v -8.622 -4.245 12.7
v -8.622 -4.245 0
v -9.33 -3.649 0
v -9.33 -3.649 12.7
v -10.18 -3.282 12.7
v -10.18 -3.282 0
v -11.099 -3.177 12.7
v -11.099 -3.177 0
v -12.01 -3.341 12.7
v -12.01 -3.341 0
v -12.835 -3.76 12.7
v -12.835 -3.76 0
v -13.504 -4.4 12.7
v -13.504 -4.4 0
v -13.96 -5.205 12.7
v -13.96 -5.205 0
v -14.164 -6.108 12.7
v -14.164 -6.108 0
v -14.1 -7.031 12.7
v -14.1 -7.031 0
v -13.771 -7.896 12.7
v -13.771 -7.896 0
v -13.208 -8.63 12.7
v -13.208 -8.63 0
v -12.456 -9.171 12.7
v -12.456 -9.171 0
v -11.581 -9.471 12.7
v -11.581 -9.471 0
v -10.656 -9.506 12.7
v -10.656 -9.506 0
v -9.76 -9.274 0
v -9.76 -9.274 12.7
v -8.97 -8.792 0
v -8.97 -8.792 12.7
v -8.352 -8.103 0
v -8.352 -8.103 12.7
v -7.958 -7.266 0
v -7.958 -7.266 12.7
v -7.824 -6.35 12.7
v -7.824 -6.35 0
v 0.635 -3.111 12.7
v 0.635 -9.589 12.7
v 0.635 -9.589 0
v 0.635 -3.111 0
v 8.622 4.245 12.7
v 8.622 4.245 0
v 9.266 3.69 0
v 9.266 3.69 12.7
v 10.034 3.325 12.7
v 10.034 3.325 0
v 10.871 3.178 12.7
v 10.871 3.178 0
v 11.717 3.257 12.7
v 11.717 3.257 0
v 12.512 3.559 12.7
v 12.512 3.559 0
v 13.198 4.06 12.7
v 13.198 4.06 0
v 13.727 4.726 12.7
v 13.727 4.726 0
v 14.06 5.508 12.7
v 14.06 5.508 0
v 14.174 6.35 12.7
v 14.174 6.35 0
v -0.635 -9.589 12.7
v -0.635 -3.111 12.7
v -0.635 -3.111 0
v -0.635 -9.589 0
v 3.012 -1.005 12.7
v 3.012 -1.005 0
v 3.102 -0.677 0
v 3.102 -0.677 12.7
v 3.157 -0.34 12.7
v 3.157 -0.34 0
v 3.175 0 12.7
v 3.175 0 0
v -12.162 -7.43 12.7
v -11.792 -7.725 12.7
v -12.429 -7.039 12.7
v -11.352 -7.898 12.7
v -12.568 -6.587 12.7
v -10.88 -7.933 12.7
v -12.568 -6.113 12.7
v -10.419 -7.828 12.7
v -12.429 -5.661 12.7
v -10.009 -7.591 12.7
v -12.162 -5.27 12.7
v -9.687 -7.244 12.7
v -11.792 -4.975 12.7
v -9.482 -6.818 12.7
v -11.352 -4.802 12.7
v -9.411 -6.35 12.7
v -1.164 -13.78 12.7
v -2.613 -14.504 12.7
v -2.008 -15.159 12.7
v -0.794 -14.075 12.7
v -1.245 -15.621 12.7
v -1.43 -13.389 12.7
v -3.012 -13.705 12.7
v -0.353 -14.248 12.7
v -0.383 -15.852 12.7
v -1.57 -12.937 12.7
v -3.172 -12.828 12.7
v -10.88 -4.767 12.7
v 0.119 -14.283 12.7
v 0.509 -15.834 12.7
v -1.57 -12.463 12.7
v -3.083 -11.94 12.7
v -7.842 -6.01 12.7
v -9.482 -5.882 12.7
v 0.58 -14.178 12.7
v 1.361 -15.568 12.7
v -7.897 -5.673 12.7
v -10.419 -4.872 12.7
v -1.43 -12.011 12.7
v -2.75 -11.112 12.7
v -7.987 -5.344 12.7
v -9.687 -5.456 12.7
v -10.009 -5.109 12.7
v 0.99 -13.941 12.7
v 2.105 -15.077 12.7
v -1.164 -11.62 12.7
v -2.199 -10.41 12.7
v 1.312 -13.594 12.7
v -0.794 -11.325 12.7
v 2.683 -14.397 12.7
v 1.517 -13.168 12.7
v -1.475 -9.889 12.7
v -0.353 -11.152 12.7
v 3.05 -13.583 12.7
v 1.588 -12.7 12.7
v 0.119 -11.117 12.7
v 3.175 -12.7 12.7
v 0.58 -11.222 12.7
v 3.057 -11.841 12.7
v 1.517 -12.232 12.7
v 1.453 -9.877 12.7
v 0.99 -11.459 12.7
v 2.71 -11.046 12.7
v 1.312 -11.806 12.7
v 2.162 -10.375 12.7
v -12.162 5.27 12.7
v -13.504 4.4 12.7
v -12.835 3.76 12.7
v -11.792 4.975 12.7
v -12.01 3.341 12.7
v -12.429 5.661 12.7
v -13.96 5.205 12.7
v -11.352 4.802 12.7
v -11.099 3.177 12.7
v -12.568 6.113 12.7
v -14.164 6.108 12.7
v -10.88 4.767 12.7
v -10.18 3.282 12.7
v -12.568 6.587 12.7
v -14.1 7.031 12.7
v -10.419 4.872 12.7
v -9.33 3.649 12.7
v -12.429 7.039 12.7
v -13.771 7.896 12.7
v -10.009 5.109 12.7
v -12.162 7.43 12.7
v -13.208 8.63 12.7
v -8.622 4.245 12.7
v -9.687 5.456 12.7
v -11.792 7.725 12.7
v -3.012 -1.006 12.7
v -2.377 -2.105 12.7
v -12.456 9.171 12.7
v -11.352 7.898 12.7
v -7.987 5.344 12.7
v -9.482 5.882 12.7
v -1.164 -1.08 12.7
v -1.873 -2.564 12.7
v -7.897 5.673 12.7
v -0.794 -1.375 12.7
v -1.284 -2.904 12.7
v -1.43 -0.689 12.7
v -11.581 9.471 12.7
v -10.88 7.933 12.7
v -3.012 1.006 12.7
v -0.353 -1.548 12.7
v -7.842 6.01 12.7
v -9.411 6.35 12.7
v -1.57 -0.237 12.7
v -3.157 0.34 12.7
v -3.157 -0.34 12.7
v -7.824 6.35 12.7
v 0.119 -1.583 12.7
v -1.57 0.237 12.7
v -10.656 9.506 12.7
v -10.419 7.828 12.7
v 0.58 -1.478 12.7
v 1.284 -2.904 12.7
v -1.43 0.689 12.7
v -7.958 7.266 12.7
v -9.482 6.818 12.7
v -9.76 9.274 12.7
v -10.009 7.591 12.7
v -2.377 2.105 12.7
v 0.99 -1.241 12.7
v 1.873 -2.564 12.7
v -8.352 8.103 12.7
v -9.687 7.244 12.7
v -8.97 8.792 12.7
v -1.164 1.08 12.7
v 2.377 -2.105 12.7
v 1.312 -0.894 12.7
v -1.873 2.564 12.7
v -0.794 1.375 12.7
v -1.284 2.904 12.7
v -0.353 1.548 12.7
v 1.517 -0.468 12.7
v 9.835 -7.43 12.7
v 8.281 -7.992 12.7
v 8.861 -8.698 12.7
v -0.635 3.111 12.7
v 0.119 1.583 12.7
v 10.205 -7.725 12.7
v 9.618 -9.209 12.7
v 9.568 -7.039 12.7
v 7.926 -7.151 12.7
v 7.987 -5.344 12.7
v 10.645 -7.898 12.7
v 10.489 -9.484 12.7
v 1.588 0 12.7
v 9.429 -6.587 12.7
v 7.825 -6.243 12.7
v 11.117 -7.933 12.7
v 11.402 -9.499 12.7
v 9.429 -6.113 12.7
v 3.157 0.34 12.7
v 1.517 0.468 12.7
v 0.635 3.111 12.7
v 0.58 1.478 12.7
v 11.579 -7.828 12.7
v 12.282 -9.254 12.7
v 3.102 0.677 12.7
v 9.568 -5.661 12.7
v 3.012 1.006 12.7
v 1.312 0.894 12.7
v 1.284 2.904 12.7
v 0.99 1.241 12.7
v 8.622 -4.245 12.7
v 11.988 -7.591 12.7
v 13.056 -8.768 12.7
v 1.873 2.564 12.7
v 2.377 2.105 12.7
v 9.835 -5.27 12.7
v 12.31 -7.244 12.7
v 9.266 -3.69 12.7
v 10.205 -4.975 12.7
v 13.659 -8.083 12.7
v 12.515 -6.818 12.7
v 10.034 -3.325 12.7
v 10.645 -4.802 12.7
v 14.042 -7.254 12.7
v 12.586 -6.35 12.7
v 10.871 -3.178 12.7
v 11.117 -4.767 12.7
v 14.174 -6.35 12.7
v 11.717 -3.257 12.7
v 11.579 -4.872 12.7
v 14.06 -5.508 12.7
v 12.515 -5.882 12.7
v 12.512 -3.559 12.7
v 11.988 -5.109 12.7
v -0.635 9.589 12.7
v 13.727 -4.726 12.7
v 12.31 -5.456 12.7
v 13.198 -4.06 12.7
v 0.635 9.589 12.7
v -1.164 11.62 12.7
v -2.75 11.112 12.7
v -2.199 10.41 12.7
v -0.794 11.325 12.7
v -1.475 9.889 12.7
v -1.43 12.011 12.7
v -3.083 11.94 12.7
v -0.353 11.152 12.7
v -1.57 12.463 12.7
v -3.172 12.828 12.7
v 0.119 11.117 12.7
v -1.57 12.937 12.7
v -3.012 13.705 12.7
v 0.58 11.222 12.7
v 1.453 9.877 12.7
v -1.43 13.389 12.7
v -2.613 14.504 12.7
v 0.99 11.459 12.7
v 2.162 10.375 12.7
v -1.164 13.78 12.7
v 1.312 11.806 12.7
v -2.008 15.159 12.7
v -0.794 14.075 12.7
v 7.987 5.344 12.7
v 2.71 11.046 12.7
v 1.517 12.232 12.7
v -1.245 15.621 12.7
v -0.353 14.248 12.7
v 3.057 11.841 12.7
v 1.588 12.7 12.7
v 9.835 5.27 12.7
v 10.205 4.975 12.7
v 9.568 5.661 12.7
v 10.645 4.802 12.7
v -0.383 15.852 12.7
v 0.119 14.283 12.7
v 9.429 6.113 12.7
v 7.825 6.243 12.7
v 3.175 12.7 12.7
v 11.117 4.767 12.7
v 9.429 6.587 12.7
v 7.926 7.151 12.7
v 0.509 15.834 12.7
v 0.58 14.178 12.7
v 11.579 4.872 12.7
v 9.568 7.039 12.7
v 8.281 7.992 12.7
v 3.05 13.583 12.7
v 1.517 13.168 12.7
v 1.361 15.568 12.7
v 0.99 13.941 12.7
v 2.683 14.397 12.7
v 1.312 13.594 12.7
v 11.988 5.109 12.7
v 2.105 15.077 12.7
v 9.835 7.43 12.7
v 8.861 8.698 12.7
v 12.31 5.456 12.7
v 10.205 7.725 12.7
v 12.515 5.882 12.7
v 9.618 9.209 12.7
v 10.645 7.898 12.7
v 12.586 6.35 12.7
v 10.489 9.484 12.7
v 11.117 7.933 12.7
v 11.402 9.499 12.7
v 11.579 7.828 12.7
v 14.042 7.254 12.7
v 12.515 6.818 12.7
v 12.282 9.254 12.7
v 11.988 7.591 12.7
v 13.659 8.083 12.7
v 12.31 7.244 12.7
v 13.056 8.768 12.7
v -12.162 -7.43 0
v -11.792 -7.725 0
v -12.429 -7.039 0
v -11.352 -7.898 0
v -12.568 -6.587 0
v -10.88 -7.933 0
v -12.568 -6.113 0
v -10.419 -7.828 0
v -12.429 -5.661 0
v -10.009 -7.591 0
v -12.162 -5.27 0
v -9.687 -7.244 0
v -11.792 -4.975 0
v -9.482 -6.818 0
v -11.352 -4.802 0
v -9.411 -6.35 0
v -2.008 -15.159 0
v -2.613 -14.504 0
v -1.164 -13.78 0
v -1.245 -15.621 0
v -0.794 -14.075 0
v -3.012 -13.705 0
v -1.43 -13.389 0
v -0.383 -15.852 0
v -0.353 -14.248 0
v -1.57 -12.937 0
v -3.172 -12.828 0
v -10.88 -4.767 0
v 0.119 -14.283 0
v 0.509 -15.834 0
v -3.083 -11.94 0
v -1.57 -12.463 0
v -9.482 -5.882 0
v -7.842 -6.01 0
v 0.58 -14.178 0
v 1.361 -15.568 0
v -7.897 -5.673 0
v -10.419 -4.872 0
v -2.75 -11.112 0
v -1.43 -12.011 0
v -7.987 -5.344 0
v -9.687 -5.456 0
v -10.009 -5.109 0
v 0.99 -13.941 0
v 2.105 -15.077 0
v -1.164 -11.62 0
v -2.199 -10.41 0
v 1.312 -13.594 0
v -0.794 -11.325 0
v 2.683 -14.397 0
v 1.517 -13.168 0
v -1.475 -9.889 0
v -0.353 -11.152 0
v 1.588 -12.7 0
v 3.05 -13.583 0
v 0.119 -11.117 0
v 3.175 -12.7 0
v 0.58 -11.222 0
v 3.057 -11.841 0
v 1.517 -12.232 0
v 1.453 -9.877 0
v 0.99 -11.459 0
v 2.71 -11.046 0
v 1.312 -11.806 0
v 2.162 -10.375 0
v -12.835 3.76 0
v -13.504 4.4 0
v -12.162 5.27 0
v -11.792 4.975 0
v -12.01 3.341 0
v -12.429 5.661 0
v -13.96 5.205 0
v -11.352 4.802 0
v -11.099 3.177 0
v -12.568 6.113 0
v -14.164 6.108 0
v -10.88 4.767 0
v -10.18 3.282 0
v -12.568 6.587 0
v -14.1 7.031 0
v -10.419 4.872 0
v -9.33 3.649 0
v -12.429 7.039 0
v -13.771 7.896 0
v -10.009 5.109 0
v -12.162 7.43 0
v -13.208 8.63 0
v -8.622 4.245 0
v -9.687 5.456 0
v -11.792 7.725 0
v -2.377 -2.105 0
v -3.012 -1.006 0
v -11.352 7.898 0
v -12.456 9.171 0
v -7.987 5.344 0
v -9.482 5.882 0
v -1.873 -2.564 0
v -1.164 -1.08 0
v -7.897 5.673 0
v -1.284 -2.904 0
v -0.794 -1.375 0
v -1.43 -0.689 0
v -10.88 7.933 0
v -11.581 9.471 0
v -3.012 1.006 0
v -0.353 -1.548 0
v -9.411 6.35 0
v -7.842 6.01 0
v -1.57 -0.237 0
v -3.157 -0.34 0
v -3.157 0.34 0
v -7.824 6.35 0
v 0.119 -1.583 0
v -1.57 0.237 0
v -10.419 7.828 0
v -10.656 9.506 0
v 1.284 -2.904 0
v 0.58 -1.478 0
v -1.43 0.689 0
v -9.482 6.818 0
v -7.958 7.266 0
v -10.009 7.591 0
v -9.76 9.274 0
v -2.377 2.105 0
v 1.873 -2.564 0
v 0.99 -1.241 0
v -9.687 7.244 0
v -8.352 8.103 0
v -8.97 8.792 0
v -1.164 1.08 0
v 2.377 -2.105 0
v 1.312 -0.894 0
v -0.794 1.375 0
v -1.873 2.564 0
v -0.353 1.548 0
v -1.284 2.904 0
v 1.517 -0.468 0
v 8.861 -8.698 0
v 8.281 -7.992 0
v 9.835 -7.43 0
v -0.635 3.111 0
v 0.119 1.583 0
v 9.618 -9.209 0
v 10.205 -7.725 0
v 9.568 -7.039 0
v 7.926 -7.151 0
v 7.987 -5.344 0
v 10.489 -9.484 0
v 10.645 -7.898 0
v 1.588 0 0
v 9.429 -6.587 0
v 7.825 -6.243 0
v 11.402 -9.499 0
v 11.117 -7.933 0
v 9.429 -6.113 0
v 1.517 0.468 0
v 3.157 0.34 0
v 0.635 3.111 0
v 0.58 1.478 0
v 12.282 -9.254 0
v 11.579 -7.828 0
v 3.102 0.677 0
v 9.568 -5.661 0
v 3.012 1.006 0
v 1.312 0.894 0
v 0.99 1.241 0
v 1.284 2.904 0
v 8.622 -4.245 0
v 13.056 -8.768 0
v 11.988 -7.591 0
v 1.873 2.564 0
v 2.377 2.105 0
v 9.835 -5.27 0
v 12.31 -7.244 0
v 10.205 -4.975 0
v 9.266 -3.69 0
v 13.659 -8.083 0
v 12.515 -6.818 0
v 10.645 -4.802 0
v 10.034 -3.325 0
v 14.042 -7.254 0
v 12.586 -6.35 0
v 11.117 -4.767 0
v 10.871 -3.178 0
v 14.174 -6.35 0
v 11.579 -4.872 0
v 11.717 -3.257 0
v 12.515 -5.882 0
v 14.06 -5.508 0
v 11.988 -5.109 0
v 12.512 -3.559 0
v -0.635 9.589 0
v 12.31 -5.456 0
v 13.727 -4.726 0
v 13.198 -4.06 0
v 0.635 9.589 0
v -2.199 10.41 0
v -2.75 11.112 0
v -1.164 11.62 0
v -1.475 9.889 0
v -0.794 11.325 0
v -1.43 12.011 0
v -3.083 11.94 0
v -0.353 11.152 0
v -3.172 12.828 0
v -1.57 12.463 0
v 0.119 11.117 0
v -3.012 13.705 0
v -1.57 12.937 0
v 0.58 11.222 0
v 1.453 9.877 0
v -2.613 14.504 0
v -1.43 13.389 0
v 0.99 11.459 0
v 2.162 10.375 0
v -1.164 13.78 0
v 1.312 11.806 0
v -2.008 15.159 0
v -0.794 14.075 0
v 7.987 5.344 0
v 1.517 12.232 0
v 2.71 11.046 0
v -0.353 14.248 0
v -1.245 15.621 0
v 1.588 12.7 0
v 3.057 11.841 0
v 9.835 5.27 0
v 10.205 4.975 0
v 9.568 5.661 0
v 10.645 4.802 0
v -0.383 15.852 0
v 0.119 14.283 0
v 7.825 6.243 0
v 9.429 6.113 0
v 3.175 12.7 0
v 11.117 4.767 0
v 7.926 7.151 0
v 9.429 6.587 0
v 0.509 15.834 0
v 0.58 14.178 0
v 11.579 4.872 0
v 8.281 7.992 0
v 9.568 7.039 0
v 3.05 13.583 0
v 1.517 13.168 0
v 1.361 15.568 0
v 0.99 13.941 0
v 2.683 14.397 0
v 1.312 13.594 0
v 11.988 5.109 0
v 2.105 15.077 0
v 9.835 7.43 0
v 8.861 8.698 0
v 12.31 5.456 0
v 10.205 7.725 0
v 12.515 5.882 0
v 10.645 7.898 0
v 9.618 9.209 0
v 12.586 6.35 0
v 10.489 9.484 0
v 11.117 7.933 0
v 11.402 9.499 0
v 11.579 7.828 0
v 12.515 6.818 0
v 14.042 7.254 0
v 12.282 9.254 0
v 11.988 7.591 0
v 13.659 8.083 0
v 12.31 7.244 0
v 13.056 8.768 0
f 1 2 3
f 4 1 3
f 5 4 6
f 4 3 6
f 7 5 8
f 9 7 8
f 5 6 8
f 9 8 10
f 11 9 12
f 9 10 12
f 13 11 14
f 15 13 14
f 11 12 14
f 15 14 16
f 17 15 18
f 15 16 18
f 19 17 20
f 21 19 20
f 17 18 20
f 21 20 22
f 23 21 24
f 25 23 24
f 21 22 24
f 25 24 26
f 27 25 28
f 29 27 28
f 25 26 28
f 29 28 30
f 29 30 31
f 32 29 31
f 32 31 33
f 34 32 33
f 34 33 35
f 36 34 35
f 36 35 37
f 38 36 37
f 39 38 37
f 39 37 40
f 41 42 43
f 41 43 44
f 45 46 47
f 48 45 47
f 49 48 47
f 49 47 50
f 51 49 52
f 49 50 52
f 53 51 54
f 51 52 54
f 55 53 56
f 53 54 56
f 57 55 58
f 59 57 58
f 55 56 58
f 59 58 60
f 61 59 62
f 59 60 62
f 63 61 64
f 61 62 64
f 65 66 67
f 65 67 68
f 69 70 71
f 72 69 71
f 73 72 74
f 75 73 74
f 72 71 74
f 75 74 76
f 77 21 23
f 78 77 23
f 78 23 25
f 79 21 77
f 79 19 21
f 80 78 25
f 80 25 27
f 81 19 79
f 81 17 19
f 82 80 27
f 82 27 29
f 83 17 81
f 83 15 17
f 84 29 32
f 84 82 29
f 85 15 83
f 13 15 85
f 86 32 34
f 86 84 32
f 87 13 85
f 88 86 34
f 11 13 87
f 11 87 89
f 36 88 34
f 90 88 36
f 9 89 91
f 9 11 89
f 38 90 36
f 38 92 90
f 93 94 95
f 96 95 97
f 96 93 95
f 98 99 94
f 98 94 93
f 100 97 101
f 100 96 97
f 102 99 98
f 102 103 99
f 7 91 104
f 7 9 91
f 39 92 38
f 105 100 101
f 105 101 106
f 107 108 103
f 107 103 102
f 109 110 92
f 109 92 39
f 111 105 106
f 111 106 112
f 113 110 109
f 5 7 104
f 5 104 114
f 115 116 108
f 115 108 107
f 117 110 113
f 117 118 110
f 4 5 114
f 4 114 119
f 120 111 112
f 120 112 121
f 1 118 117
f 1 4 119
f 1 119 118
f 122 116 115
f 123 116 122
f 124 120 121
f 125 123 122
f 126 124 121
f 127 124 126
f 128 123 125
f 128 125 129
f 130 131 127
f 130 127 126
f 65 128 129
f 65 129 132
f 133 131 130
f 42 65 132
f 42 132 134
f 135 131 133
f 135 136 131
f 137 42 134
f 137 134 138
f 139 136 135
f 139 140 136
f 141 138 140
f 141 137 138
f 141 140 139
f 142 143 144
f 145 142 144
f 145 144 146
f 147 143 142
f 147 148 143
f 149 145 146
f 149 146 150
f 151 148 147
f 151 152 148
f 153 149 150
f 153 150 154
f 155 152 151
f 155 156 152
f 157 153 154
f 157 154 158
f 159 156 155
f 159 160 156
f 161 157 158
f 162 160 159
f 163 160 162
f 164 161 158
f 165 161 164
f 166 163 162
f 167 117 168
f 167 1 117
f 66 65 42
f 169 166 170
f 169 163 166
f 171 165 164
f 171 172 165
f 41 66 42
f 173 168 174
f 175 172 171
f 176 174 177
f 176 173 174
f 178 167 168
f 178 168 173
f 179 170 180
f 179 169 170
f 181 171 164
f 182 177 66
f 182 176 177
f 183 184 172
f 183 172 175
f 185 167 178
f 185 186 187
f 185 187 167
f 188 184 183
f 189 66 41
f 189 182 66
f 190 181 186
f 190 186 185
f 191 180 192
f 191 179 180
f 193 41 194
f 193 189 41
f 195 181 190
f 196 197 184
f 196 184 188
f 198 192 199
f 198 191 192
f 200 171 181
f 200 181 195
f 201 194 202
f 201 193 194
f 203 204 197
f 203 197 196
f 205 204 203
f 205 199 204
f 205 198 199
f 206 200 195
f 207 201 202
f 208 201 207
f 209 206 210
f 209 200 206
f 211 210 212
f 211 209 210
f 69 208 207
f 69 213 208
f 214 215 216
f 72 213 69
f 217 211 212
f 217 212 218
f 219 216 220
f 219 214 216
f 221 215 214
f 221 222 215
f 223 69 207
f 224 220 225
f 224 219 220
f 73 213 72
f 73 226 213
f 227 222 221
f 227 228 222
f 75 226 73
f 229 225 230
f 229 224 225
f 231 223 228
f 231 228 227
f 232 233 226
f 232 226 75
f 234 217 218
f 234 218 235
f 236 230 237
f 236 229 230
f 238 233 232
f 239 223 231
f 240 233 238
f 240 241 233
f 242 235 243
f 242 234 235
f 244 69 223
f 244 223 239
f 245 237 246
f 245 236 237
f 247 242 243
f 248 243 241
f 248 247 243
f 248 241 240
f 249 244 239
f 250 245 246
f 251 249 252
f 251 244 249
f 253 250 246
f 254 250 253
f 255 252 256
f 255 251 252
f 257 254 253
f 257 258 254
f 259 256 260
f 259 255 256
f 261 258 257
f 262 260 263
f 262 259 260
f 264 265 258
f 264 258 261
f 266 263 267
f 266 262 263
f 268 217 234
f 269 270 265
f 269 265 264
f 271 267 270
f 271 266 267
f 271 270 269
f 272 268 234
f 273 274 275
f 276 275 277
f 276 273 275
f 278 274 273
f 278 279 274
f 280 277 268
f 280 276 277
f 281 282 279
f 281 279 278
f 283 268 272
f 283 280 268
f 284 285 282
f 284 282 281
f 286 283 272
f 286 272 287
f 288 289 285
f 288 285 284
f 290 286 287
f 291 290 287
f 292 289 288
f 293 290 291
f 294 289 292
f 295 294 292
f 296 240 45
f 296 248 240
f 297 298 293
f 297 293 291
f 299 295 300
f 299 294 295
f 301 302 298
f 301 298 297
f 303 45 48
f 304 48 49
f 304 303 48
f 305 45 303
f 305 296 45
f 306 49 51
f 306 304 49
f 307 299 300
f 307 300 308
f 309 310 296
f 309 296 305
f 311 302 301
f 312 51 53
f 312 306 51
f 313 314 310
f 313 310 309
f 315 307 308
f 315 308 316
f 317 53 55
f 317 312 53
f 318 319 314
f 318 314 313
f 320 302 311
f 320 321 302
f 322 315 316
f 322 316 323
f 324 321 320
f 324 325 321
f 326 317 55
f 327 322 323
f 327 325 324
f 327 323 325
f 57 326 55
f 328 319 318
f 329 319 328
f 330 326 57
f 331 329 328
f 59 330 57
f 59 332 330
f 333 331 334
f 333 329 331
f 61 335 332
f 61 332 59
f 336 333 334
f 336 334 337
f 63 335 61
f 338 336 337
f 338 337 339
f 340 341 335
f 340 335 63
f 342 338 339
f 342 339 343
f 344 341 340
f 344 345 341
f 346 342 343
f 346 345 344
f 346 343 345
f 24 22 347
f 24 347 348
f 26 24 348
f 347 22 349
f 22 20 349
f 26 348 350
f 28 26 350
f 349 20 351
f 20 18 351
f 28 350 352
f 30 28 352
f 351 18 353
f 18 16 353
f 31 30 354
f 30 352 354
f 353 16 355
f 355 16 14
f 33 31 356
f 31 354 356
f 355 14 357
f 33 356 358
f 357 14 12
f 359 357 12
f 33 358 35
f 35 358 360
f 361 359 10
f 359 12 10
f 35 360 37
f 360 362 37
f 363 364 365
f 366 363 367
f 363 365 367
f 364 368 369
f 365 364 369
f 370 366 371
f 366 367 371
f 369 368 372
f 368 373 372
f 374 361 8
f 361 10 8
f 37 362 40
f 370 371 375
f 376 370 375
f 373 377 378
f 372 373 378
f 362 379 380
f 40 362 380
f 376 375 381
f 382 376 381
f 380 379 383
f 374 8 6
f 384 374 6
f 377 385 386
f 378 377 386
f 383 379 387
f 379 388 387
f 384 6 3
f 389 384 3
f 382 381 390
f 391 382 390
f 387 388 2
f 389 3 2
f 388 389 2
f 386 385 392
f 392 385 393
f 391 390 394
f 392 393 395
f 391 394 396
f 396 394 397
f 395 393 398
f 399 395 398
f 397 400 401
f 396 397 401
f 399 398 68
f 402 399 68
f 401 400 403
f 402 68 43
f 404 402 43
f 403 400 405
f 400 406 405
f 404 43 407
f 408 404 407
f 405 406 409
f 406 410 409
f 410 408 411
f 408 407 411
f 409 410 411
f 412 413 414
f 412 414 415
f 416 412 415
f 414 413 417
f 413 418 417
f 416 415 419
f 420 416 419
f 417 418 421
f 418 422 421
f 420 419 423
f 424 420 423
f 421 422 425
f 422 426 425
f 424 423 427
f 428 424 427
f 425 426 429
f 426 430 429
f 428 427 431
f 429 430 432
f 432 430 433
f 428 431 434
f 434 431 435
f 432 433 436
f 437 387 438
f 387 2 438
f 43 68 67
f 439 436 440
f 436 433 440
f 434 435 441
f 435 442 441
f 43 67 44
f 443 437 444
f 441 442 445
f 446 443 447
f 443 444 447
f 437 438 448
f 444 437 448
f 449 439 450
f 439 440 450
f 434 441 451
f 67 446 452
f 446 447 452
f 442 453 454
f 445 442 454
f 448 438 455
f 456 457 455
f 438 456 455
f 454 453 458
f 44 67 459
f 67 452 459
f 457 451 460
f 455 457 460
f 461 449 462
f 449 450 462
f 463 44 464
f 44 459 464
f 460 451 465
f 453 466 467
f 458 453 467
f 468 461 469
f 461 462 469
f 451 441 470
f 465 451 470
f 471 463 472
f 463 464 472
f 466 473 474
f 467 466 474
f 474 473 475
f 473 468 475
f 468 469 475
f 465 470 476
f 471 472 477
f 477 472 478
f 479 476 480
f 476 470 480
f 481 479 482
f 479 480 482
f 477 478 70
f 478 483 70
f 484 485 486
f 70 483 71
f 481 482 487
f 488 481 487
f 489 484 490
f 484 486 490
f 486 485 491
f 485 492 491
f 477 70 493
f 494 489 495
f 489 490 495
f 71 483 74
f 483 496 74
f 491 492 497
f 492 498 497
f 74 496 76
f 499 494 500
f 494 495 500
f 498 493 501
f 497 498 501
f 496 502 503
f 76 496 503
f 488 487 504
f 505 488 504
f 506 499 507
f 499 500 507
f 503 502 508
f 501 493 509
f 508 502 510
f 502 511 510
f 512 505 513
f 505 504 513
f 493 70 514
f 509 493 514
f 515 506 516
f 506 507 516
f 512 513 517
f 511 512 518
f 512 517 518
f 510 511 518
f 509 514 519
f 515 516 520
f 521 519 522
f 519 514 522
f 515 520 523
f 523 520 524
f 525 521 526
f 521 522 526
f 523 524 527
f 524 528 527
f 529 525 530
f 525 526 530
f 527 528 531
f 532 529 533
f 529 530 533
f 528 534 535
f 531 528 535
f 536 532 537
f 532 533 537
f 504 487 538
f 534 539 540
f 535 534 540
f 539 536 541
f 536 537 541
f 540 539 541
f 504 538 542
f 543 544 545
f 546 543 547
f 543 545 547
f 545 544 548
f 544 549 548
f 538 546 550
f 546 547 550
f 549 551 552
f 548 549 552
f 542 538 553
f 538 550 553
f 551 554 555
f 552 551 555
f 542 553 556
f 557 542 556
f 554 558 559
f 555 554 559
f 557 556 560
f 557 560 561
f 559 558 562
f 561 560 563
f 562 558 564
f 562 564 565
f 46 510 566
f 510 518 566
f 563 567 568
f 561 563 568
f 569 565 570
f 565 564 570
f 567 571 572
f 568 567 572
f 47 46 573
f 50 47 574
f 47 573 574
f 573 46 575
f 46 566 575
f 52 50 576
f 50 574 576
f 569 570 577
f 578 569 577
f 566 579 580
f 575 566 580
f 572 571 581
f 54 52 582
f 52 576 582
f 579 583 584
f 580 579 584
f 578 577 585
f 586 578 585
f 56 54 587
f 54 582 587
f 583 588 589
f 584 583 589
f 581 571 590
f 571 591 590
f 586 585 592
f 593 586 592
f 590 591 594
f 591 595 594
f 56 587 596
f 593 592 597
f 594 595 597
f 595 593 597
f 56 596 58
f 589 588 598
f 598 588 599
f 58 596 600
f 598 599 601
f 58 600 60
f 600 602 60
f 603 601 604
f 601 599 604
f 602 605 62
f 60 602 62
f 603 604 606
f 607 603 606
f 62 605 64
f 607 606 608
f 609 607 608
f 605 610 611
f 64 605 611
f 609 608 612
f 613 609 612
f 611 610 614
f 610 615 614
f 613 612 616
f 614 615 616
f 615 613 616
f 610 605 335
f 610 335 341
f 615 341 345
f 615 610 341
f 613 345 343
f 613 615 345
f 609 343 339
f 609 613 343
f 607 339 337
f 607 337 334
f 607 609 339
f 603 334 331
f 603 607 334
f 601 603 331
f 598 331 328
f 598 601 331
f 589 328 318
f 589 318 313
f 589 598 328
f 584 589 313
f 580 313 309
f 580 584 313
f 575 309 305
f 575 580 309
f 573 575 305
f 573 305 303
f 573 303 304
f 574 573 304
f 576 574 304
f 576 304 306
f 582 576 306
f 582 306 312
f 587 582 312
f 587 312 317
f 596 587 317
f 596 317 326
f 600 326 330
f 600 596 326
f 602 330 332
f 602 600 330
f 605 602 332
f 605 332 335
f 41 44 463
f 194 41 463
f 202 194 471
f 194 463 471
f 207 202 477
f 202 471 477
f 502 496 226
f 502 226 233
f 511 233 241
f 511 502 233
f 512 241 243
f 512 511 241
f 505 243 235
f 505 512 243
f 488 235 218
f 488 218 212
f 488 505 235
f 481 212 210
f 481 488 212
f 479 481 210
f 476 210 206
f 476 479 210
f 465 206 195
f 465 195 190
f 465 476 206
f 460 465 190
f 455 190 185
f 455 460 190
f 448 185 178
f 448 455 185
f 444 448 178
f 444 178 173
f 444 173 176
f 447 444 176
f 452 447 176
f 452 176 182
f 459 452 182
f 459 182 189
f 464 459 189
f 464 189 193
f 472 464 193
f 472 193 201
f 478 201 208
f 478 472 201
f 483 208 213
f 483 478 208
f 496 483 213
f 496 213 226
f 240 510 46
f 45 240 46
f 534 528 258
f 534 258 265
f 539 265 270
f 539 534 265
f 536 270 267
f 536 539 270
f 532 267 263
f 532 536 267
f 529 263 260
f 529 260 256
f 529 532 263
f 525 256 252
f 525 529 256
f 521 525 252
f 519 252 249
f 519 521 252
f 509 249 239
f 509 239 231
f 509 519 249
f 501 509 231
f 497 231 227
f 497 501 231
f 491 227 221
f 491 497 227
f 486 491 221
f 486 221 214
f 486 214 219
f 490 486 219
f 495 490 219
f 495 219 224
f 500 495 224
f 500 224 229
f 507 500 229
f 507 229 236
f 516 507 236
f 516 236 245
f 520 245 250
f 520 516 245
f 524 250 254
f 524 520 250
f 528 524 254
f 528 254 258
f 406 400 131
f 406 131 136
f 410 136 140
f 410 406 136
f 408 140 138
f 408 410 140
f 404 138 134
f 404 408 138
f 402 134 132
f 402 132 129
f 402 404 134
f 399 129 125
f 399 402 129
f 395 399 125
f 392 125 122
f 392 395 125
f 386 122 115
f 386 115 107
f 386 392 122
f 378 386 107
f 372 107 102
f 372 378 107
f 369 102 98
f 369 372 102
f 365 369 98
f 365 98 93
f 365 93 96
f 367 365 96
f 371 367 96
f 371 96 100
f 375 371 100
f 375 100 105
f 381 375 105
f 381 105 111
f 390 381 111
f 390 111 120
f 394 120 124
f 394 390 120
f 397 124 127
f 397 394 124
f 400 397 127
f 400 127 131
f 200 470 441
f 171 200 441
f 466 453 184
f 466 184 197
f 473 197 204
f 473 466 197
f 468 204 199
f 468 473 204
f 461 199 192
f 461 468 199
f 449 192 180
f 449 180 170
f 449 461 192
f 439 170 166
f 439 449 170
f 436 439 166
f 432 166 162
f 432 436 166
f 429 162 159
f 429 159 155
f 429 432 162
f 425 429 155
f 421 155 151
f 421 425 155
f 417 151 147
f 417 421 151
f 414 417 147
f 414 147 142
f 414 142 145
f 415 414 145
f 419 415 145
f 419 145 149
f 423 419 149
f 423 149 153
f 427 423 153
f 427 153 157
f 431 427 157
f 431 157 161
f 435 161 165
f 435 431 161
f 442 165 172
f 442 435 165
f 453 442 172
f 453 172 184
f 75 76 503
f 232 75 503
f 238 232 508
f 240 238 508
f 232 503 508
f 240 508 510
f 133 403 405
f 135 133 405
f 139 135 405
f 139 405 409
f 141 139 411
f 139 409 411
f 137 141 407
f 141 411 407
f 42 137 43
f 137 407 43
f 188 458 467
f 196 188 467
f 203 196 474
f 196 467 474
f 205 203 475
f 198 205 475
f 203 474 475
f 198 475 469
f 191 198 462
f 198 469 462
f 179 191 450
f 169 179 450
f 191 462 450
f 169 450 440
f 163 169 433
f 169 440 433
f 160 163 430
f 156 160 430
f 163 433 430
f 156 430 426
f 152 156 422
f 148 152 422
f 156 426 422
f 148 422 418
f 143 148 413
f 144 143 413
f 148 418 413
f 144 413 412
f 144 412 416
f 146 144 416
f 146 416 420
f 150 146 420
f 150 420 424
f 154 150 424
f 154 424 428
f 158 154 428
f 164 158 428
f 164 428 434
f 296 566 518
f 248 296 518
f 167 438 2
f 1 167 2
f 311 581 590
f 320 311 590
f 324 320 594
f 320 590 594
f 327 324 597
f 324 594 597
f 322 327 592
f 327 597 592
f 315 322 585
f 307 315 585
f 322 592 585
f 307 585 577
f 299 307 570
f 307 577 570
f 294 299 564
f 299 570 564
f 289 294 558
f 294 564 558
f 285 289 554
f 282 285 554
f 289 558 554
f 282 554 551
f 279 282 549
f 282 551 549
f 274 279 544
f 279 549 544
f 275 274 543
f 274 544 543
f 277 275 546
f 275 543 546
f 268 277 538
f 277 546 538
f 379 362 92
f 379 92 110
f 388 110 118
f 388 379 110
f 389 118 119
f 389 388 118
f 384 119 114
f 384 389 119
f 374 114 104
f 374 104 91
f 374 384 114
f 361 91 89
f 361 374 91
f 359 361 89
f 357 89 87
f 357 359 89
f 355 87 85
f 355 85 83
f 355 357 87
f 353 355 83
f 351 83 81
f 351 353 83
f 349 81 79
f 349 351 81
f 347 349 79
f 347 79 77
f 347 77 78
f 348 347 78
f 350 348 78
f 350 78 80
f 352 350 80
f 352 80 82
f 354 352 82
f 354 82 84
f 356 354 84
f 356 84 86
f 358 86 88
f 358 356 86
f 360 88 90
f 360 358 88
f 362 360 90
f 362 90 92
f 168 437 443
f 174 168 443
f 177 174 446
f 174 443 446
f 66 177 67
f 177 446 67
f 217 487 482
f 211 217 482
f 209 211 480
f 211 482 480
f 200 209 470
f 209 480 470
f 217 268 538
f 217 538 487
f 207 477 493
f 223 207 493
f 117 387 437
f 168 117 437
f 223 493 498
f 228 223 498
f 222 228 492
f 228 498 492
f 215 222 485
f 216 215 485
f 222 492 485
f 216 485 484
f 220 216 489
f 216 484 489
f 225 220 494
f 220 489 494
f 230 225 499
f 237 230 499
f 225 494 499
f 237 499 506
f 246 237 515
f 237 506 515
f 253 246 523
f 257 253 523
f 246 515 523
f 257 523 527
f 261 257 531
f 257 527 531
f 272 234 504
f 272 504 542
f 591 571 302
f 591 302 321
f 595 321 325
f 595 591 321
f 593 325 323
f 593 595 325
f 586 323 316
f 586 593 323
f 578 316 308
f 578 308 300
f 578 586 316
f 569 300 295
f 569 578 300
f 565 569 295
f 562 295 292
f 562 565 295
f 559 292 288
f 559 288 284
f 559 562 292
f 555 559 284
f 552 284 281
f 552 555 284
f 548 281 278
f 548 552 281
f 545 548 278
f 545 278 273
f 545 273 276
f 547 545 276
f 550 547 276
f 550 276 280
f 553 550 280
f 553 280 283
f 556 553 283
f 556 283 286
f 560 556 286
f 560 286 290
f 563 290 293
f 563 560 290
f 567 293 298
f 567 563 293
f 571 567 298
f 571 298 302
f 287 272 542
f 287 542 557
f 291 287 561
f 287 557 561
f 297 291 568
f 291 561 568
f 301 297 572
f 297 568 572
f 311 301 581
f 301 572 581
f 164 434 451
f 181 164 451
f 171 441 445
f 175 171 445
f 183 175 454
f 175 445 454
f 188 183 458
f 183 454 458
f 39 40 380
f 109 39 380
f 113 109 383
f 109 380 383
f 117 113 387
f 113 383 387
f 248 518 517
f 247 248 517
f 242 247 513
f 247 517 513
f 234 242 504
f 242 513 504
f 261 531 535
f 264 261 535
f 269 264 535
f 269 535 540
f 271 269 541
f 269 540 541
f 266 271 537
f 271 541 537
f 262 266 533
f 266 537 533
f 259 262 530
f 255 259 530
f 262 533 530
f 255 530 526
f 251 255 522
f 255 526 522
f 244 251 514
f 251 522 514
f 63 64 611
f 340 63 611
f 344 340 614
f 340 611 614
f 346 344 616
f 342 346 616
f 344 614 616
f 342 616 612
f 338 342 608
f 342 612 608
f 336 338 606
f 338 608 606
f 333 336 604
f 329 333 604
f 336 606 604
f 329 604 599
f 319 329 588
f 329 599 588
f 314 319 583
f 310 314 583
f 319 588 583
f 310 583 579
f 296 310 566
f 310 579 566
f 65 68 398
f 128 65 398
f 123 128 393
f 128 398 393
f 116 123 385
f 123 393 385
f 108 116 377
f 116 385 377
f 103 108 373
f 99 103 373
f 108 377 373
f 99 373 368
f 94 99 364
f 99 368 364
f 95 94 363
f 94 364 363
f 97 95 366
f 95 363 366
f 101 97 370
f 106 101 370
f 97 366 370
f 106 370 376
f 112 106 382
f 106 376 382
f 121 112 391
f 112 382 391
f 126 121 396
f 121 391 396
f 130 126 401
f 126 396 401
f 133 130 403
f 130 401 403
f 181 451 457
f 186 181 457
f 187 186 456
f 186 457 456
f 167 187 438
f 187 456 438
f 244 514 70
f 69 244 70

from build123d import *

# Parameters (mm, degrees)
F0_R     = 1.5875
F1_DEPTH = 12.7


with BuildPart() as f1:
    # F0 (on Top) → F1 (new body)
    with BuildSketch(Plane.XY):
        with BuildLine():
            ThreePointArc((3.011577, -1.0055), (3.133878, -0.509347), (3.175, 0))
            ThreePointArc((3.175, 0), (3.133878, 0.509347), (3.011577, 1.0055))
            ThreePointArc((3.011577, 1.0055), (2.749631, 1.5875), (2.376577, 2.105352))
            ThreePointArc((2.376577, 2.105352), (1.5875, 2.749631), (0.635, 3.110852))
            ThreePointArc((0.635, 3.110852), (0, 3.175), (-0.635, 3.110852))
            ThreePointArc((-0.635, 3.110852), (-1.5875, 2.749631), (-2.376577, 2.105352))
            ThreePointArc((-2.376577, 2.105352), (-2.749631, 1.5875), (-3.011577, 1.0055))
            ThreePointArc((-3.011577, 1.0055), (-3.175, 0), (-3.011577, -1.0055))
            ThreePointArc((-3.011577, -1.0055), (-2.749631, -1.5875), (-2.376577, -2.105352))
            ThreePointArc((-2.376577, -2.105352), (-1.5875, -2.749631), (-0.635, -3.110852))
            ThreePointArc((-0.635, -3.110852), (0, -3.175), (0.635, -3.110852))
            ThreePointArc((0.635, -3.110852), (1.5875, -2.749631), (2.376577, -2.105352))
            ThreePointArc((2.376577, -2.105352), (2.749631, -1.5875), (3.011577, -1.0055))
        make_face()
        Circle(F0_R, mode=Mode.SUBTRACT)
        with BuildLine():
            ThreePointArc((2.376577, 2.105352), (2.749631, 1.5875), (3.011577, 1.0055))
            Line((3.011577, 1.0055), (8.621946, 4.244648))
            ThreePointArc((8.621946, 4.244648), (8.248892, 4.7625), (7.986946, 5.3445))
            Line((7.986946, 5.3445), (2.376577, 2.105352))
        make_face()
        with BuildLine():
            Line((8.621946, -4.244648), (3.011577, -1.0055))
            ThreePointArc((3.011577, -1.0055), (2.749631, -1.5875), (2.376577, -2.105352))
            Line((2.376577, -2.105352), (7.986946, -5.3445))
            ThreePointArc((7.986946, -5.3445), (8.248892, -4.7625), (8.621946, -4.244648))
        make_face()
        with BuildLine():
            ThreePointArc((7.986946, 5.3445), (8.248892, 4.7625), (8.621946, 4.244648))
            ThreePointArc((8.621946, 4.244648), (12.124354, 3.381309), (14.173523, 6.35))
            ThreePointArc((14.173523, 6.35), (10.489176, 9.483878), (7.986946, 5.3445))
        make_face()
        with Locations((10.998523, 6.35)):
            Circle(F0_R, mode=Mode.SUBTRACT)
        with BuildLine():
            ThreePointArc((14.173523, -6.35), (12.124354, -3.381309), (8.621946, -4.244648))
            ThreePointArc((8.621946, -4.244648), (8.248892, -4.7625), (7.986946, -5.3445))
            ThreePointArc((7.986946, -5.3445), (10.489176, -9.483878), (14.173523, -6.35))
        make_face()
        with Locations((10.998523, -6.35)):
            Circle(F0_R, mode=Mode.SUBTRACT)
        with BuildLine():
            ThreePointArc((-0.635, 3.110852), (0, 3.175), (0.635, 3.110852))
            Line((0.635, 3.110852), (0.635, 9.589148))
            ThreePointArc((0.635, 9.589148), (0, 9.525), (-0.635, 9.589148))
            Line((-0.635, 9.589148), (-0.635, 3.110852))
        make_face()
        with BuildLine():
            Line((0.635, -9.589148), (0.635, -3.110852))
            ThreePointArc((0.635, -3.110852), (0, -3.175), (-0.635, -3.110852))
            Line((-0.635, -3.110852), (-0.635, -9.589148))
            ThreePointArc((-0.635, -9.589148), (0, -9.525), (0.635, -9.589148))
        make_face()
        with BuildLine():
            ThreePointArc((-0.635, 9.589148), (0, 9.525), (0.635, 9.589148))
            ThreePointArc((0.635, 9.589148), (2.459344, 10.691954), (3.175, 12.7))
            ThreePointArc((3.175, 12.7), (-2.008046, 15.159344), (-0.635, 9.589148))
        make_face()
        with Locations((0, 12.7)):
            Circle(F0_R, mode=Mode.SUBTRACT)
        with BuildLine():
            ThreePointArc((3.175, -12.7), (2.459344, -10.691954), (0.635, -9.589148))
            ThreePointArc((0.635, -9.589148), (0, -9.525), (-0.635, -9.589148))
            ThreePointArc((-0.635, -9.589148), (-2.008046, -15.159344), (3.175, -12.7))
        make_face()
        with Locations((0, -12.7)):
            Circle(F0_R, mode=Mode.SUBTRACT)
        with BuildLine():
            ThreePointArc((-3.011577, 1.0055), (-2.749631, 1.5875), (-2.376577, 2.105352))
            Line((-2.376577, 2.105352), (-7.986946, 5.3445))
            ThreePointArc((-7.986946, 5.3445), (-8.248892, 4.7625), (-8.621946, 4.244648))
            Line((-8.621946, 4.244648), (-3.011577, 1.0055))
        make_face()
        with BuildLine():
            Line((-7.986946, -5.3445), (-2.376577, -2.105352))
            ThreePointArc((-2.376577, -2.105352), (-2.749631, -1.5875), (-3.011577, -1.0055))
            Line((-3.011577, -1.0055), (-8.621946, -4.244648))
            ThreePointArc((-8.621946, -4.244648), (-8.248892, -4.7625), (-7.986946, -5.3445))
        make_face()
        with BuildLine():
            ThreePointArc((-8.621946, 4.244648), (-8.248892, 4.7625), (-7.986946, 5.3445))
            ThreePointArc((-7.986946, 5.3445), (-7.864645, 5.840653), (-7.823523, 6.35))
            ThreePointArc((-7.823523, 6.35), (-13.967214, 7.475832), (-8.621946, 4.244648))
        make_face()
        with Locations((-10.998523, 6.35)):
            Circle(F0_R, mode=Mode.SUBTRACT)
        with BuildLine():
            ThreePointArc((-7.823523, -6.35), (-7.864645, -5.840653), (-7.986946, -5.3445))
            ThreePointArc((-7.986946, -5.3445), (-8.248892, -4.7625), (-8.621946, -4.244648))
            ThreePointArc((-8.621946, -4.244648), (-13.967214, -7.475832), (-7.823523, -6.35))
        make_face()
        with Locations((-10.998523, -6.35)):
            Circle(F0_R, mode=Mode.SUBTRACT)
    extrude(amount=F1_DEPTH)


solid = f1.part
